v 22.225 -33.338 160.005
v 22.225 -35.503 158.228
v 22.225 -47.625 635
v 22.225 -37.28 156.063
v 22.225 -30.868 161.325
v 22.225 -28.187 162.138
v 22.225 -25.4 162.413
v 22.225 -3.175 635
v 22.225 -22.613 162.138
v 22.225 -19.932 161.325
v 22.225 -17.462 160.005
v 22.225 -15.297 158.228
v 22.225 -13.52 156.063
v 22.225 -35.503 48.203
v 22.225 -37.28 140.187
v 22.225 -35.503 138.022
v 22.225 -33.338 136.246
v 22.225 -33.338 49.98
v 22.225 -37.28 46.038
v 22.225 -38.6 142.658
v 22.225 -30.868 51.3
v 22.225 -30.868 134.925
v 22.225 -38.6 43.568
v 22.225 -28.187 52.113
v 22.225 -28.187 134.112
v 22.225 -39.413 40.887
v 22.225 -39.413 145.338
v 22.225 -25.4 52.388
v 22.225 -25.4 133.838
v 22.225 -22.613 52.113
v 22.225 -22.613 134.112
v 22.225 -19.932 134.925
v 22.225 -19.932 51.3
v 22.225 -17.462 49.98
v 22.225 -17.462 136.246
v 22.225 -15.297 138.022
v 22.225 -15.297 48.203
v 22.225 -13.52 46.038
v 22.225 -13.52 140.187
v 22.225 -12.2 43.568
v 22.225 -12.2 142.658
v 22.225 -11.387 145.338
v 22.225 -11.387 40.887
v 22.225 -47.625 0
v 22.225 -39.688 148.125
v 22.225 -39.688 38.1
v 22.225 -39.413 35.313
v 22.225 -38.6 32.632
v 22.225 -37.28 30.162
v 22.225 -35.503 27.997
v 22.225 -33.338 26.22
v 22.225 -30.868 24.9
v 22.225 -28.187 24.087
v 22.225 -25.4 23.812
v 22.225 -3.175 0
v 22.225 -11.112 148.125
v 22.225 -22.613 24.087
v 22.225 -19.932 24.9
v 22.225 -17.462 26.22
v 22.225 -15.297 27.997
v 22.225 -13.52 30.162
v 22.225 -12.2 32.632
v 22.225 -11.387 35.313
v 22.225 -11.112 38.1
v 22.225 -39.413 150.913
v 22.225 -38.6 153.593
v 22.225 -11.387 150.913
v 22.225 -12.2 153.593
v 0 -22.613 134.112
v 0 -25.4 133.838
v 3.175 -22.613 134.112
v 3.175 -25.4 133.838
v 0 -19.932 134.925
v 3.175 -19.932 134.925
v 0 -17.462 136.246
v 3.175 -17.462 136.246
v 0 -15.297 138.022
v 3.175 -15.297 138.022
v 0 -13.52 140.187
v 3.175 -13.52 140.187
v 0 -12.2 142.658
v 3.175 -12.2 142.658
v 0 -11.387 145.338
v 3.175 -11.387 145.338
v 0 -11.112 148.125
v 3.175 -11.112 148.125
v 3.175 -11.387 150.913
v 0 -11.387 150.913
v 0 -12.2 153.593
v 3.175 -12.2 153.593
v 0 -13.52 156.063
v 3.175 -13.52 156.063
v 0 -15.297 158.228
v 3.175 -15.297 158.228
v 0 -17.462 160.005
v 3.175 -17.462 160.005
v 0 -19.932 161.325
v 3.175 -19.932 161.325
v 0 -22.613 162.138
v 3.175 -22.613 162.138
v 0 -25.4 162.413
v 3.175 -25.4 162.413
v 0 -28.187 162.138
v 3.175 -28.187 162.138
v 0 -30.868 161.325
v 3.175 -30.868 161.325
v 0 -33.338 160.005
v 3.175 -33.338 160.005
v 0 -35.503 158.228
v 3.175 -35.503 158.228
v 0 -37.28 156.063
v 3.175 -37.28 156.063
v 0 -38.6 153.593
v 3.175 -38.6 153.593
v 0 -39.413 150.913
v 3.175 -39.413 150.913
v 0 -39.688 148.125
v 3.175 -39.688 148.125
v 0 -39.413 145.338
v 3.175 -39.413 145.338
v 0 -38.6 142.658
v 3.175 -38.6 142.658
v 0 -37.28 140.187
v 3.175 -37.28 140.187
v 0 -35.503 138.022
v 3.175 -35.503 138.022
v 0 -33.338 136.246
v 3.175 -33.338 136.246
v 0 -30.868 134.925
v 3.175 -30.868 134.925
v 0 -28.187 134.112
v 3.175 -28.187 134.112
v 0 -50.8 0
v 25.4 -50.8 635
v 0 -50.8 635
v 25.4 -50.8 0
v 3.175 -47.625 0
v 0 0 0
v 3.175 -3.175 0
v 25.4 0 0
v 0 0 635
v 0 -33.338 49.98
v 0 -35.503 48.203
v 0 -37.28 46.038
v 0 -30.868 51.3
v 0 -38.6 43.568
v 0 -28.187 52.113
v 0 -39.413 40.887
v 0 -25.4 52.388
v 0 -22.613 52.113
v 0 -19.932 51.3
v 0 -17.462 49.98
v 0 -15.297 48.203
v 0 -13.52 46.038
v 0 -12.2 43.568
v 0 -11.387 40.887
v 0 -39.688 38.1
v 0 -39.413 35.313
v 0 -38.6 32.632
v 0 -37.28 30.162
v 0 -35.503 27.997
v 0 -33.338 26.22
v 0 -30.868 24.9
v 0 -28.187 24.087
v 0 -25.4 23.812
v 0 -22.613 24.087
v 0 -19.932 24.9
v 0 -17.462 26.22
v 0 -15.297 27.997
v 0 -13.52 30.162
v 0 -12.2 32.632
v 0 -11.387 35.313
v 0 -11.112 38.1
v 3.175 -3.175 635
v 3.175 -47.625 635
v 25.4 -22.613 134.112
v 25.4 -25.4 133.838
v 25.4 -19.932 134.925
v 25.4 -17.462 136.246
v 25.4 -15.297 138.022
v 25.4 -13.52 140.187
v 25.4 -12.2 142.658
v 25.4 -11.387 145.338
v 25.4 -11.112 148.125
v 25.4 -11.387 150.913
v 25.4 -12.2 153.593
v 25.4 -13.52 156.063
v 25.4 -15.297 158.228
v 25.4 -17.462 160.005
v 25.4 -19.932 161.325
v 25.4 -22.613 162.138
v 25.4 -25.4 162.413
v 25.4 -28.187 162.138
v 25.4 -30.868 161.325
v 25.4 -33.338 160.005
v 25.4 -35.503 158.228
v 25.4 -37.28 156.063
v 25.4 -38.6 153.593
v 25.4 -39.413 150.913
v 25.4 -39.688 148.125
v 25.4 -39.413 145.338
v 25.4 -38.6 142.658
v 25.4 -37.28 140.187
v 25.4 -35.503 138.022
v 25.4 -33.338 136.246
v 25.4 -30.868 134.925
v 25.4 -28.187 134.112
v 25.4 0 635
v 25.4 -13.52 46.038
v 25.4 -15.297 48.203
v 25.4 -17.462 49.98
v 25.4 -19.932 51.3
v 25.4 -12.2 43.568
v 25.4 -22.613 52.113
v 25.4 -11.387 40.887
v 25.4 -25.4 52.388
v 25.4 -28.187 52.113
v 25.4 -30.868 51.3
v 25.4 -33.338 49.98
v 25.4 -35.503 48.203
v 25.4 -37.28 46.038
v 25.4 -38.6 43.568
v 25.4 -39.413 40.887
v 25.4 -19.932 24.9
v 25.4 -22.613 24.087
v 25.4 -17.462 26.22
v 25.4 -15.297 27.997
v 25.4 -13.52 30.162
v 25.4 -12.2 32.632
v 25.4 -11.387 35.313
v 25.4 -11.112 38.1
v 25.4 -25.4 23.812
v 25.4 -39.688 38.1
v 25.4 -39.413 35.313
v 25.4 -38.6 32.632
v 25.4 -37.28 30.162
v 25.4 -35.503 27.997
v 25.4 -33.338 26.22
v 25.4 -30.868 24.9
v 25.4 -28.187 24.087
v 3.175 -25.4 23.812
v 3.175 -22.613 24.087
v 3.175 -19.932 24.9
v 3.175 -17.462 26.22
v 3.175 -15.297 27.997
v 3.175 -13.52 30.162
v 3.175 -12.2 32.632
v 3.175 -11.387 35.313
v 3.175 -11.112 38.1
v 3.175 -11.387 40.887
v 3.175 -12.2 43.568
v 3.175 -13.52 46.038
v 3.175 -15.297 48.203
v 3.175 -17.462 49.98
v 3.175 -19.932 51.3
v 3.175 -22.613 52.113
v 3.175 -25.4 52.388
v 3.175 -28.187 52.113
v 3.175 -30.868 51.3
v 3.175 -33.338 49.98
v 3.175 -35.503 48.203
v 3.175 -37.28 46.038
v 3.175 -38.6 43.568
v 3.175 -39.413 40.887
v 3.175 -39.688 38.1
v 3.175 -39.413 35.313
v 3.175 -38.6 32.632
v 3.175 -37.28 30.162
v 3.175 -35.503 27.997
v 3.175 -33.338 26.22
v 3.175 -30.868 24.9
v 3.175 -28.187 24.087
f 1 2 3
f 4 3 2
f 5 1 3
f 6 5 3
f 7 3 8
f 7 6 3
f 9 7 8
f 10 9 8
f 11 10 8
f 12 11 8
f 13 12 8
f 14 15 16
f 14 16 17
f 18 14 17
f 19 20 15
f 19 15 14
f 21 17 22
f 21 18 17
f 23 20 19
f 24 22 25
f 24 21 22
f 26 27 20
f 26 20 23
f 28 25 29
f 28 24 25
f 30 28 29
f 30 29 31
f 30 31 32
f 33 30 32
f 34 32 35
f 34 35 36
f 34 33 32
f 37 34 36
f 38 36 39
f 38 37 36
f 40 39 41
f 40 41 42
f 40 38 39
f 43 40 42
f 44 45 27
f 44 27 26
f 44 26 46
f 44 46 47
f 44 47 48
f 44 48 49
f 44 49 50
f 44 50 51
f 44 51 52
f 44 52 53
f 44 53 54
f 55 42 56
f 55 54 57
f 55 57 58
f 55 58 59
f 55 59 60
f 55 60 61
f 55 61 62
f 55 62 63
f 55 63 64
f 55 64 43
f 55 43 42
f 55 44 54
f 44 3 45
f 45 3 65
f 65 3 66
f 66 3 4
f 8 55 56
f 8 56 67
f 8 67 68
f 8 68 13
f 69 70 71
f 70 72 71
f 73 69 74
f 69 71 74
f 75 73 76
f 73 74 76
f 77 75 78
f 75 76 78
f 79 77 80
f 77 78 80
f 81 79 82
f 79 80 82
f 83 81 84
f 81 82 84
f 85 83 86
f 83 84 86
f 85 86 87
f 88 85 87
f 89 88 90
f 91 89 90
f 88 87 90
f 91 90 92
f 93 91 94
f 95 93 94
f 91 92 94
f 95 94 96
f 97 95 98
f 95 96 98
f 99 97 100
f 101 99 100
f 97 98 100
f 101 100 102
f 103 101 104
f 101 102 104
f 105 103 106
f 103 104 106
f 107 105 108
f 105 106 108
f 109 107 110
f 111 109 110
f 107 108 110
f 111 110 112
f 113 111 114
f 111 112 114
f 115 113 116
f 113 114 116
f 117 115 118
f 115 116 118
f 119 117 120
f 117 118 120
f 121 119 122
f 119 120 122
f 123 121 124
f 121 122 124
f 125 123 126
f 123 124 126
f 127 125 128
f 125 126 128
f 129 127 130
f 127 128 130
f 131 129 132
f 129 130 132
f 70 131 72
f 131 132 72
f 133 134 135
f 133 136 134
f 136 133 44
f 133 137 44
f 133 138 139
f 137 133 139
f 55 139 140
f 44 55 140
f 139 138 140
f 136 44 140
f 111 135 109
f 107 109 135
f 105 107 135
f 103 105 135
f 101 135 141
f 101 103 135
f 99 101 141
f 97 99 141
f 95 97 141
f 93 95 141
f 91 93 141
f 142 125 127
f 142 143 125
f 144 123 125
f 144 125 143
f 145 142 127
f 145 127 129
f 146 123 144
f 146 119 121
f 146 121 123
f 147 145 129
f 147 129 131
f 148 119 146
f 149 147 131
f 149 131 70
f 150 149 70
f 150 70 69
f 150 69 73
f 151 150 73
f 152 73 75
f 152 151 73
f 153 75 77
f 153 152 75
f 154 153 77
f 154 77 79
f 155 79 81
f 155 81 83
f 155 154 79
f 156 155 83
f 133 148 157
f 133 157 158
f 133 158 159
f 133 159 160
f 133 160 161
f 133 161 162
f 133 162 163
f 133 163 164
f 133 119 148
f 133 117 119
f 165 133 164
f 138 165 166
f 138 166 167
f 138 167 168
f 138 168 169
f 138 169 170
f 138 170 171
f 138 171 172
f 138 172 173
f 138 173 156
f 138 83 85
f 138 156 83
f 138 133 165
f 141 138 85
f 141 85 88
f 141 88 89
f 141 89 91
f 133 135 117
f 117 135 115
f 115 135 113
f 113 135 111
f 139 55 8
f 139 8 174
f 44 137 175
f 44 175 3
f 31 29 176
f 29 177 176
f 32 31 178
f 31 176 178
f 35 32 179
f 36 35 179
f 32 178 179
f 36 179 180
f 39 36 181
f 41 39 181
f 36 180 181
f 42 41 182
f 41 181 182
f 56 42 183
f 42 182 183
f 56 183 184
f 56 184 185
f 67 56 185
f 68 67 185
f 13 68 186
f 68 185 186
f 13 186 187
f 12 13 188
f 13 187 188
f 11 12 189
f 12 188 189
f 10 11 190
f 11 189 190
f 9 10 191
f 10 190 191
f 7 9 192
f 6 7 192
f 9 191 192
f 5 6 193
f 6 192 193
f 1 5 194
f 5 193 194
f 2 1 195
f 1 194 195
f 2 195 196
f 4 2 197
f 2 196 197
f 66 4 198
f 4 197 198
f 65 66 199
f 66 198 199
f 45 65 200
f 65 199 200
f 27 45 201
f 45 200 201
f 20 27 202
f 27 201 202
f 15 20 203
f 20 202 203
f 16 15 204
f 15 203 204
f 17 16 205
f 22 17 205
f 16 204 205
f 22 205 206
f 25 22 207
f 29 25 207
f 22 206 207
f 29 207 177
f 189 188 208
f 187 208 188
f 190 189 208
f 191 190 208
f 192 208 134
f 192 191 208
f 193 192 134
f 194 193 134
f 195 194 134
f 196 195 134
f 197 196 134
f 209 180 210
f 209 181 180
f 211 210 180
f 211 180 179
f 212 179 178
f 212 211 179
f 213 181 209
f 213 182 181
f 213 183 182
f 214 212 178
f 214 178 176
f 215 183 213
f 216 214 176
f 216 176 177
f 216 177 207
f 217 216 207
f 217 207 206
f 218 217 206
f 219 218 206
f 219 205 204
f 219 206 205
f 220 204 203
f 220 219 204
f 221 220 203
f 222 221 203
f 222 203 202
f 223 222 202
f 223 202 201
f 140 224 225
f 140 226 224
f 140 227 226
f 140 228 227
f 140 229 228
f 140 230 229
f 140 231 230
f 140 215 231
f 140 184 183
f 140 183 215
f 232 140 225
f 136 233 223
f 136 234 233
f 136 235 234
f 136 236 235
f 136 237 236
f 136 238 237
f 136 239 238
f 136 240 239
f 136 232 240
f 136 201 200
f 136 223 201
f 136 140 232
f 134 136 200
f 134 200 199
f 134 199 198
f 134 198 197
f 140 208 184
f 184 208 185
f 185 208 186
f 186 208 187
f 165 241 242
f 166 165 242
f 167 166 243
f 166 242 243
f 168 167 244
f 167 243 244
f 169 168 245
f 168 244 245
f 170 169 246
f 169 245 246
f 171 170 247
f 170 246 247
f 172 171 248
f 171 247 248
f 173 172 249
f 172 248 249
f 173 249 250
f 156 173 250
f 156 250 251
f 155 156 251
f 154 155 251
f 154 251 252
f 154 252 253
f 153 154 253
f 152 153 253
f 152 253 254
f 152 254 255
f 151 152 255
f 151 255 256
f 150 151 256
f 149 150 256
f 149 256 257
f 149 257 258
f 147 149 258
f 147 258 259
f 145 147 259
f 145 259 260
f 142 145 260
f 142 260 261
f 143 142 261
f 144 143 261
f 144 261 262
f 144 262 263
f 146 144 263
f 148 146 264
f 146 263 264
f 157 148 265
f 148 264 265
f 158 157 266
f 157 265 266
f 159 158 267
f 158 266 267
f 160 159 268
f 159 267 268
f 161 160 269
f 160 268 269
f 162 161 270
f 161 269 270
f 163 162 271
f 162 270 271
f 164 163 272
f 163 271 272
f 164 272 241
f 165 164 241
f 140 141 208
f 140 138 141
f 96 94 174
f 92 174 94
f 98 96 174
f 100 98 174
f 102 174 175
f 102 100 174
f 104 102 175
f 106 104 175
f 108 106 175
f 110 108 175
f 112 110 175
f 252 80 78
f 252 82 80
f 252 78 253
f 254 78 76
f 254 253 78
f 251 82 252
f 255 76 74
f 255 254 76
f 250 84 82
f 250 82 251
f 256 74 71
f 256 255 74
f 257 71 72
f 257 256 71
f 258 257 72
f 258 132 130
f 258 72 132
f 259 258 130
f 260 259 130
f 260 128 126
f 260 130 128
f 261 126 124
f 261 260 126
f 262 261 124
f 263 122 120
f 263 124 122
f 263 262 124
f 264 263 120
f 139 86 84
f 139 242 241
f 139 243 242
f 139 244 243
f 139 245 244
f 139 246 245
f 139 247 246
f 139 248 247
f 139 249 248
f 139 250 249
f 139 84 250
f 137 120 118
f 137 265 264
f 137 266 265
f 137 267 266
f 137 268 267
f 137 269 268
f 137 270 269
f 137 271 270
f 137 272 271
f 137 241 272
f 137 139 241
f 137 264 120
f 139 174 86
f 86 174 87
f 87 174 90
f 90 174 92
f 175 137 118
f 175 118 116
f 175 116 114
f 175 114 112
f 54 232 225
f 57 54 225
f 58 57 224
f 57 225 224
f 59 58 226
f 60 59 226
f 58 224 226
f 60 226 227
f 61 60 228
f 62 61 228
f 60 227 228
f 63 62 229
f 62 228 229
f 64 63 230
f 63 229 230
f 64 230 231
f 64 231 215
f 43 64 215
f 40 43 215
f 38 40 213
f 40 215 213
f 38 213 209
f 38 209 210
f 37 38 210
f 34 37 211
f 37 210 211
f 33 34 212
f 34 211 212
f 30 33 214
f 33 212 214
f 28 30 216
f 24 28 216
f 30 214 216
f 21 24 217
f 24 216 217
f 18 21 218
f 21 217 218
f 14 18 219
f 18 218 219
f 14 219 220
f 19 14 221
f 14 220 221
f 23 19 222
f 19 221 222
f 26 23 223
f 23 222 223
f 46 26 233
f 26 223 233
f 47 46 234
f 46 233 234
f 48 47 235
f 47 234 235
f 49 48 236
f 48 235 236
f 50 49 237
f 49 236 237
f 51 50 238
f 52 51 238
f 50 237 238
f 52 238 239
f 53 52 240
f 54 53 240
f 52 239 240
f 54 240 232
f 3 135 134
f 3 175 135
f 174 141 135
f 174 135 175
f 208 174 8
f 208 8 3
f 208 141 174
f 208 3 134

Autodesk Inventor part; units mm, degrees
ref_plane "YZ Plane" through (0, 0, 0) normal (1, 0, 0) x (0, 1, 0)
ref_plane "XZ Plane" through (0, 0, 0) normal (0, 1, 0) x (-1, 0, 0)
ref_plane "XY Plane" through (0, 0, 0) normal (0, 0, 1) x (1, 0, 0)
sketch "Sketch1" plane through (0, 0, 0) normal (0, 0, 1) x (1, 0, 0)
  line L0 (0, 0) -> (25.4, 0)
  line L1 (25.4, 0) -> (25.4, -50.8)
  line L2 (25.4, -50.8) -> (0, -50.8)
  line L3 (0, -50.8) -> (0, 0)
  line L4 (22.225, -3.175) -> (3.175, -3.175)
  line L5 (3.175, -3.175) -> (3.175, -47.625)
  line L6 (3.175, -47.625) -> (22.225, -47.625)
  line L7 (22.225, -47.625) -> (22.225, -3.175)
  dimension "d0" = 25.4
  dimension "d1" = 50.8
  dimension "d2" = 3.175
extrude "Extrusion1" add sketch "Sketch1" along normal blind 635
sketch "Sketch2" plane through (25.4, -50.8, 0) normal (1, 0, 0) x (0, 0, -1)
  circle A0 centre (-38.1, 25.4) radius 14.2875
  line L0 (0, 50.8) -> (0, 0) projected
  line L1 (0, 50.8) -> (-635, 50.8) projected
  circle A1 centre (-148.1252, 25.4) radius 14.2875
  dimension "d5" = 38.1
  dimension "d6" = 25.4
  dimension "d7" = 28.575
  dimension "d8" = 110.0252
  dimension "d9" = 28.575
  dimension "d10" = 25.4
extrude "Extrusion2" cut sketch "Sketch2" against normal blind 25.4
properties part number "DRL Tall"
